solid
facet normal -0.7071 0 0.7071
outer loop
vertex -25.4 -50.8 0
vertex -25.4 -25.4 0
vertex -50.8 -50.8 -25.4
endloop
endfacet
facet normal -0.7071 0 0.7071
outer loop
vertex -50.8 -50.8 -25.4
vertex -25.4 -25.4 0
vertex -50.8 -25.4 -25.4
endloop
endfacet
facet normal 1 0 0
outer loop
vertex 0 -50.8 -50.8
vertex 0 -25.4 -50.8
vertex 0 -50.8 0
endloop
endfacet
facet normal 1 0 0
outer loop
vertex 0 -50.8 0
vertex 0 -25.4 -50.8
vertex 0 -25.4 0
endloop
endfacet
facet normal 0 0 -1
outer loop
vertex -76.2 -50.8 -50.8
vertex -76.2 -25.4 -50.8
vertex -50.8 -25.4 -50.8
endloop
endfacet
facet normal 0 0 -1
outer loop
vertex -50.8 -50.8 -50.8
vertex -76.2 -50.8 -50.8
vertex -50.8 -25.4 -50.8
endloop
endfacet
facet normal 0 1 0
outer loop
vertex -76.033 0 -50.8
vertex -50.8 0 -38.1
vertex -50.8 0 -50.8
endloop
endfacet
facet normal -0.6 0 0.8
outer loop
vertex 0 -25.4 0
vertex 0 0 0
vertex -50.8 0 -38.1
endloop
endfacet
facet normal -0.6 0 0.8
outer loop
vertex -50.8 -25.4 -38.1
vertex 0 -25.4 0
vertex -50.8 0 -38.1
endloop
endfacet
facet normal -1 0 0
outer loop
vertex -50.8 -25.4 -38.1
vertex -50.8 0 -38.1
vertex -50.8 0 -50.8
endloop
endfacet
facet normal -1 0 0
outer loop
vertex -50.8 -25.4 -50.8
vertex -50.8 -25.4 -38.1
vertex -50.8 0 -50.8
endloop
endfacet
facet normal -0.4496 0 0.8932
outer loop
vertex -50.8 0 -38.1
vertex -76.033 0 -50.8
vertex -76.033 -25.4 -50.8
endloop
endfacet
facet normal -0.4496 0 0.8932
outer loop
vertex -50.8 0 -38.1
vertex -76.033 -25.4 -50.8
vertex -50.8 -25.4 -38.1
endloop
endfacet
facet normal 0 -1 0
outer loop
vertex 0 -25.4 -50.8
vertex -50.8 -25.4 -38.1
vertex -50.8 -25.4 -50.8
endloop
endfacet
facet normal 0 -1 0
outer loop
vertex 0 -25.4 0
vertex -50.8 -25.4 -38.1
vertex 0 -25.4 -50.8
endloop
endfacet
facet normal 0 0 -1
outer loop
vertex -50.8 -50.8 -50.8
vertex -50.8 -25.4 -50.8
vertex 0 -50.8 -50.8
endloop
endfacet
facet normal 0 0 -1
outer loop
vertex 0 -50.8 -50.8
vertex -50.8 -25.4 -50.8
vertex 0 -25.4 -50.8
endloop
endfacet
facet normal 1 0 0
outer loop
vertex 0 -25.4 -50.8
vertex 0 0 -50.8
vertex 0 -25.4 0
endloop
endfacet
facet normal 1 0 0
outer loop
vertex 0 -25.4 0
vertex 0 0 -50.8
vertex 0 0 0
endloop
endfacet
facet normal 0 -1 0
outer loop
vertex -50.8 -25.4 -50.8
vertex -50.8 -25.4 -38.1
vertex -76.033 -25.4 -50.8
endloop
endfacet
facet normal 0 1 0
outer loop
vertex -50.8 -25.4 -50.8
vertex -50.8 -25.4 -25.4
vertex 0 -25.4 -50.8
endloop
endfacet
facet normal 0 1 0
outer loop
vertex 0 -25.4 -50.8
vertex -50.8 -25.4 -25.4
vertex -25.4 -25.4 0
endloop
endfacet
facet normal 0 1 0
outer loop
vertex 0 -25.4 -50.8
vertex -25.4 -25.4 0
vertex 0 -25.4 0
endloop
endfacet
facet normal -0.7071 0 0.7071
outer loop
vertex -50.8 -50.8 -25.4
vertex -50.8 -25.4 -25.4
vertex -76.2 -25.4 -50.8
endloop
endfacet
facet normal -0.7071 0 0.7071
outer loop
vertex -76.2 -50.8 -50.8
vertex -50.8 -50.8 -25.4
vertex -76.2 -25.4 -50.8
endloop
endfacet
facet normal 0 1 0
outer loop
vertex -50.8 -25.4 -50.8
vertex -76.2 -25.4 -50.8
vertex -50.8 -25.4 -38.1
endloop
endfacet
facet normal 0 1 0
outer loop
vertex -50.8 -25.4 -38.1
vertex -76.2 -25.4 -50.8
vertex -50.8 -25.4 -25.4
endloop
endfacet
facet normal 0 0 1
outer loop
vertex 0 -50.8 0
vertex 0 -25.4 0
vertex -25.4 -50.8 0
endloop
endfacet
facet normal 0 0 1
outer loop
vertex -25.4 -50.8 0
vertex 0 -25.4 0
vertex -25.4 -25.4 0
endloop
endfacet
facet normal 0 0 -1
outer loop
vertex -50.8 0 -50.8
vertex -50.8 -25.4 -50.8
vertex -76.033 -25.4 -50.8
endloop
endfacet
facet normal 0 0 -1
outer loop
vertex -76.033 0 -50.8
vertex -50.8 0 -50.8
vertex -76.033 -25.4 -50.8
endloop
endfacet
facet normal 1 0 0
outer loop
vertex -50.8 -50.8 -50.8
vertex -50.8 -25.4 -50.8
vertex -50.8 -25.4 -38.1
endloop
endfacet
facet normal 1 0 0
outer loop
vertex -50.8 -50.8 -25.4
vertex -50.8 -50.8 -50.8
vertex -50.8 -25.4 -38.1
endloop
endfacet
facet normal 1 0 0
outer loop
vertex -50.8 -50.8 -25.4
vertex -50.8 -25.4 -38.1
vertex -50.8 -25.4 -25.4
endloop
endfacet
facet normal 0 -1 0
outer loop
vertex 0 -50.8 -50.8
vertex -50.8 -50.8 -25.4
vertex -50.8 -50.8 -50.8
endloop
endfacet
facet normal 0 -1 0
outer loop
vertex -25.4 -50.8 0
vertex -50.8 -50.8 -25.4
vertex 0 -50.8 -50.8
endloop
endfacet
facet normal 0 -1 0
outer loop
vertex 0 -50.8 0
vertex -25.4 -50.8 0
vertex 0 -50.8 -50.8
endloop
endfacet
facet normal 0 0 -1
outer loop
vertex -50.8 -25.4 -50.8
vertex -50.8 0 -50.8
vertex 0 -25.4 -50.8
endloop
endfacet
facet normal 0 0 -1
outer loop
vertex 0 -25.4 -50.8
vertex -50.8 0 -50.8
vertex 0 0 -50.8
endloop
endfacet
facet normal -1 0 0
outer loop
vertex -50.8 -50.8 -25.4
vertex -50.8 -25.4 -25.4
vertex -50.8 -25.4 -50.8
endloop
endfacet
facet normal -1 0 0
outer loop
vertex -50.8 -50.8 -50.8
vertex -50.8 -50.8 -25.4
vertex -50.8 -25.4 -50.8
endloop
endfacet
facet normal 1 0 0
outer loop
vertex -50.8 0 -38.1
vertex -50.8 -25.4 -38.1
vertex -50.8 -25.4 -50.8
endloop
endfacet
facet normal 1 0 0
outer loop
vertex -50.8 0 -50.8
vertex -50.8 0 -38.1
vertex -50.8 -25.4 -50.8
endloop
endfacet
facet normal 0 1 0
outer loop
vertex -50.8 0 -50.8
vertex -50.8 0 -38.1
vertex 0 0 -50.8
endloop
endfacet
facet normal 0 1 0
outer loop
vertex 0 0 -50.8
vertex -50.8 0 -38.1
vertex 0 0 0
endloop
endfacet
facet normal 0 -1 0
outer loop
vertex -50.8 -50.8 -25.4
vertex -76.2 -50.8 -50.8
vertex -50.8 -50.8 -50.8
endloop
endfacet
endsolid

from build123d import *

# Parameters (mm, degrees)
F1_DEPTH  = 25.4
F3_DEPTH  = 25.4
F5_DEPTH  = 25.4
F7_DEPTH  = 25.4
F9_DEPTH  = 25.4
F11_DEPTH = 25.4


with BuildPart() as f1:
    # F0 (on Front) → F1 (new body)
    with BuildSketch(Plane.XZ):
        Polygon((0, -50.8), (0, 0), (-25.4, 0), (-50.8, -25.4), (-50.8, -50.8), align=None)
    extrude(amount=F1_DEPTH)



with BuildPart() as f3:
    # F2 (on face) → F3 (new body)
    with BuildSketch(Plane.XZ.offset(25.4)):
        Polygon((-76.2, -50.8), (-50.8, -50.8), (-50.8, -38.1), align=None)
    extrude(amount=F3_DEPTH)


with BuildPart() as f1_1:
    add(f1.part)

    add(f3.part)  # F5 merges F3
    # F4 (on face) → F5 (join)
    with BuildSketch(Plane.XZ.offset(25.4)):
        Polygon((-76.2, -50.8), (-50.8, -38.1), (-50.8, -25.4), align=None)
    extrude(amount=F5_DEPTH)

    # F10 (on face) → F11 (cut)
    with BuildSketch(Plane(origin=(0, 0, 0), x_dir=(-1, 0, 0), z_dir=(0, 1, 0))):
        Polygon((0, 0), (50.8, -38.1), (50.8, -25.4), (25.4, 0), align=None)
    extrude(amount=-F11_DEPTH, mode=Mode.SUBTRACT)


with BuildPart() as f7:
    # F6 (on face) → F7 (new body)
    with BuildSketch(Plane.XZ.offset(25.4)):
        Polygon((-25.4, 0), (-50.8, -25.4), (-50.8, -50.8), (0, -50.8), (0, 0), align=None)
    extrude(amount=F7_DEPTH)


with BuildPart() as f9:
    # F8 (on face) → F9 (new body)
    with BuildSketch(Plane(origin=(0, 0, 0), x_dir=(-1, 0, 0), z_dir=(0, 1, 0))):
        Polygon((76.0328620672, -50.8), (50.8, -38.1), (50.8, -50.8), align=None)
    extrude(amount=-F9_DEPTH)


solid = Compound([f1_1.part, f7.part, f9.part])
